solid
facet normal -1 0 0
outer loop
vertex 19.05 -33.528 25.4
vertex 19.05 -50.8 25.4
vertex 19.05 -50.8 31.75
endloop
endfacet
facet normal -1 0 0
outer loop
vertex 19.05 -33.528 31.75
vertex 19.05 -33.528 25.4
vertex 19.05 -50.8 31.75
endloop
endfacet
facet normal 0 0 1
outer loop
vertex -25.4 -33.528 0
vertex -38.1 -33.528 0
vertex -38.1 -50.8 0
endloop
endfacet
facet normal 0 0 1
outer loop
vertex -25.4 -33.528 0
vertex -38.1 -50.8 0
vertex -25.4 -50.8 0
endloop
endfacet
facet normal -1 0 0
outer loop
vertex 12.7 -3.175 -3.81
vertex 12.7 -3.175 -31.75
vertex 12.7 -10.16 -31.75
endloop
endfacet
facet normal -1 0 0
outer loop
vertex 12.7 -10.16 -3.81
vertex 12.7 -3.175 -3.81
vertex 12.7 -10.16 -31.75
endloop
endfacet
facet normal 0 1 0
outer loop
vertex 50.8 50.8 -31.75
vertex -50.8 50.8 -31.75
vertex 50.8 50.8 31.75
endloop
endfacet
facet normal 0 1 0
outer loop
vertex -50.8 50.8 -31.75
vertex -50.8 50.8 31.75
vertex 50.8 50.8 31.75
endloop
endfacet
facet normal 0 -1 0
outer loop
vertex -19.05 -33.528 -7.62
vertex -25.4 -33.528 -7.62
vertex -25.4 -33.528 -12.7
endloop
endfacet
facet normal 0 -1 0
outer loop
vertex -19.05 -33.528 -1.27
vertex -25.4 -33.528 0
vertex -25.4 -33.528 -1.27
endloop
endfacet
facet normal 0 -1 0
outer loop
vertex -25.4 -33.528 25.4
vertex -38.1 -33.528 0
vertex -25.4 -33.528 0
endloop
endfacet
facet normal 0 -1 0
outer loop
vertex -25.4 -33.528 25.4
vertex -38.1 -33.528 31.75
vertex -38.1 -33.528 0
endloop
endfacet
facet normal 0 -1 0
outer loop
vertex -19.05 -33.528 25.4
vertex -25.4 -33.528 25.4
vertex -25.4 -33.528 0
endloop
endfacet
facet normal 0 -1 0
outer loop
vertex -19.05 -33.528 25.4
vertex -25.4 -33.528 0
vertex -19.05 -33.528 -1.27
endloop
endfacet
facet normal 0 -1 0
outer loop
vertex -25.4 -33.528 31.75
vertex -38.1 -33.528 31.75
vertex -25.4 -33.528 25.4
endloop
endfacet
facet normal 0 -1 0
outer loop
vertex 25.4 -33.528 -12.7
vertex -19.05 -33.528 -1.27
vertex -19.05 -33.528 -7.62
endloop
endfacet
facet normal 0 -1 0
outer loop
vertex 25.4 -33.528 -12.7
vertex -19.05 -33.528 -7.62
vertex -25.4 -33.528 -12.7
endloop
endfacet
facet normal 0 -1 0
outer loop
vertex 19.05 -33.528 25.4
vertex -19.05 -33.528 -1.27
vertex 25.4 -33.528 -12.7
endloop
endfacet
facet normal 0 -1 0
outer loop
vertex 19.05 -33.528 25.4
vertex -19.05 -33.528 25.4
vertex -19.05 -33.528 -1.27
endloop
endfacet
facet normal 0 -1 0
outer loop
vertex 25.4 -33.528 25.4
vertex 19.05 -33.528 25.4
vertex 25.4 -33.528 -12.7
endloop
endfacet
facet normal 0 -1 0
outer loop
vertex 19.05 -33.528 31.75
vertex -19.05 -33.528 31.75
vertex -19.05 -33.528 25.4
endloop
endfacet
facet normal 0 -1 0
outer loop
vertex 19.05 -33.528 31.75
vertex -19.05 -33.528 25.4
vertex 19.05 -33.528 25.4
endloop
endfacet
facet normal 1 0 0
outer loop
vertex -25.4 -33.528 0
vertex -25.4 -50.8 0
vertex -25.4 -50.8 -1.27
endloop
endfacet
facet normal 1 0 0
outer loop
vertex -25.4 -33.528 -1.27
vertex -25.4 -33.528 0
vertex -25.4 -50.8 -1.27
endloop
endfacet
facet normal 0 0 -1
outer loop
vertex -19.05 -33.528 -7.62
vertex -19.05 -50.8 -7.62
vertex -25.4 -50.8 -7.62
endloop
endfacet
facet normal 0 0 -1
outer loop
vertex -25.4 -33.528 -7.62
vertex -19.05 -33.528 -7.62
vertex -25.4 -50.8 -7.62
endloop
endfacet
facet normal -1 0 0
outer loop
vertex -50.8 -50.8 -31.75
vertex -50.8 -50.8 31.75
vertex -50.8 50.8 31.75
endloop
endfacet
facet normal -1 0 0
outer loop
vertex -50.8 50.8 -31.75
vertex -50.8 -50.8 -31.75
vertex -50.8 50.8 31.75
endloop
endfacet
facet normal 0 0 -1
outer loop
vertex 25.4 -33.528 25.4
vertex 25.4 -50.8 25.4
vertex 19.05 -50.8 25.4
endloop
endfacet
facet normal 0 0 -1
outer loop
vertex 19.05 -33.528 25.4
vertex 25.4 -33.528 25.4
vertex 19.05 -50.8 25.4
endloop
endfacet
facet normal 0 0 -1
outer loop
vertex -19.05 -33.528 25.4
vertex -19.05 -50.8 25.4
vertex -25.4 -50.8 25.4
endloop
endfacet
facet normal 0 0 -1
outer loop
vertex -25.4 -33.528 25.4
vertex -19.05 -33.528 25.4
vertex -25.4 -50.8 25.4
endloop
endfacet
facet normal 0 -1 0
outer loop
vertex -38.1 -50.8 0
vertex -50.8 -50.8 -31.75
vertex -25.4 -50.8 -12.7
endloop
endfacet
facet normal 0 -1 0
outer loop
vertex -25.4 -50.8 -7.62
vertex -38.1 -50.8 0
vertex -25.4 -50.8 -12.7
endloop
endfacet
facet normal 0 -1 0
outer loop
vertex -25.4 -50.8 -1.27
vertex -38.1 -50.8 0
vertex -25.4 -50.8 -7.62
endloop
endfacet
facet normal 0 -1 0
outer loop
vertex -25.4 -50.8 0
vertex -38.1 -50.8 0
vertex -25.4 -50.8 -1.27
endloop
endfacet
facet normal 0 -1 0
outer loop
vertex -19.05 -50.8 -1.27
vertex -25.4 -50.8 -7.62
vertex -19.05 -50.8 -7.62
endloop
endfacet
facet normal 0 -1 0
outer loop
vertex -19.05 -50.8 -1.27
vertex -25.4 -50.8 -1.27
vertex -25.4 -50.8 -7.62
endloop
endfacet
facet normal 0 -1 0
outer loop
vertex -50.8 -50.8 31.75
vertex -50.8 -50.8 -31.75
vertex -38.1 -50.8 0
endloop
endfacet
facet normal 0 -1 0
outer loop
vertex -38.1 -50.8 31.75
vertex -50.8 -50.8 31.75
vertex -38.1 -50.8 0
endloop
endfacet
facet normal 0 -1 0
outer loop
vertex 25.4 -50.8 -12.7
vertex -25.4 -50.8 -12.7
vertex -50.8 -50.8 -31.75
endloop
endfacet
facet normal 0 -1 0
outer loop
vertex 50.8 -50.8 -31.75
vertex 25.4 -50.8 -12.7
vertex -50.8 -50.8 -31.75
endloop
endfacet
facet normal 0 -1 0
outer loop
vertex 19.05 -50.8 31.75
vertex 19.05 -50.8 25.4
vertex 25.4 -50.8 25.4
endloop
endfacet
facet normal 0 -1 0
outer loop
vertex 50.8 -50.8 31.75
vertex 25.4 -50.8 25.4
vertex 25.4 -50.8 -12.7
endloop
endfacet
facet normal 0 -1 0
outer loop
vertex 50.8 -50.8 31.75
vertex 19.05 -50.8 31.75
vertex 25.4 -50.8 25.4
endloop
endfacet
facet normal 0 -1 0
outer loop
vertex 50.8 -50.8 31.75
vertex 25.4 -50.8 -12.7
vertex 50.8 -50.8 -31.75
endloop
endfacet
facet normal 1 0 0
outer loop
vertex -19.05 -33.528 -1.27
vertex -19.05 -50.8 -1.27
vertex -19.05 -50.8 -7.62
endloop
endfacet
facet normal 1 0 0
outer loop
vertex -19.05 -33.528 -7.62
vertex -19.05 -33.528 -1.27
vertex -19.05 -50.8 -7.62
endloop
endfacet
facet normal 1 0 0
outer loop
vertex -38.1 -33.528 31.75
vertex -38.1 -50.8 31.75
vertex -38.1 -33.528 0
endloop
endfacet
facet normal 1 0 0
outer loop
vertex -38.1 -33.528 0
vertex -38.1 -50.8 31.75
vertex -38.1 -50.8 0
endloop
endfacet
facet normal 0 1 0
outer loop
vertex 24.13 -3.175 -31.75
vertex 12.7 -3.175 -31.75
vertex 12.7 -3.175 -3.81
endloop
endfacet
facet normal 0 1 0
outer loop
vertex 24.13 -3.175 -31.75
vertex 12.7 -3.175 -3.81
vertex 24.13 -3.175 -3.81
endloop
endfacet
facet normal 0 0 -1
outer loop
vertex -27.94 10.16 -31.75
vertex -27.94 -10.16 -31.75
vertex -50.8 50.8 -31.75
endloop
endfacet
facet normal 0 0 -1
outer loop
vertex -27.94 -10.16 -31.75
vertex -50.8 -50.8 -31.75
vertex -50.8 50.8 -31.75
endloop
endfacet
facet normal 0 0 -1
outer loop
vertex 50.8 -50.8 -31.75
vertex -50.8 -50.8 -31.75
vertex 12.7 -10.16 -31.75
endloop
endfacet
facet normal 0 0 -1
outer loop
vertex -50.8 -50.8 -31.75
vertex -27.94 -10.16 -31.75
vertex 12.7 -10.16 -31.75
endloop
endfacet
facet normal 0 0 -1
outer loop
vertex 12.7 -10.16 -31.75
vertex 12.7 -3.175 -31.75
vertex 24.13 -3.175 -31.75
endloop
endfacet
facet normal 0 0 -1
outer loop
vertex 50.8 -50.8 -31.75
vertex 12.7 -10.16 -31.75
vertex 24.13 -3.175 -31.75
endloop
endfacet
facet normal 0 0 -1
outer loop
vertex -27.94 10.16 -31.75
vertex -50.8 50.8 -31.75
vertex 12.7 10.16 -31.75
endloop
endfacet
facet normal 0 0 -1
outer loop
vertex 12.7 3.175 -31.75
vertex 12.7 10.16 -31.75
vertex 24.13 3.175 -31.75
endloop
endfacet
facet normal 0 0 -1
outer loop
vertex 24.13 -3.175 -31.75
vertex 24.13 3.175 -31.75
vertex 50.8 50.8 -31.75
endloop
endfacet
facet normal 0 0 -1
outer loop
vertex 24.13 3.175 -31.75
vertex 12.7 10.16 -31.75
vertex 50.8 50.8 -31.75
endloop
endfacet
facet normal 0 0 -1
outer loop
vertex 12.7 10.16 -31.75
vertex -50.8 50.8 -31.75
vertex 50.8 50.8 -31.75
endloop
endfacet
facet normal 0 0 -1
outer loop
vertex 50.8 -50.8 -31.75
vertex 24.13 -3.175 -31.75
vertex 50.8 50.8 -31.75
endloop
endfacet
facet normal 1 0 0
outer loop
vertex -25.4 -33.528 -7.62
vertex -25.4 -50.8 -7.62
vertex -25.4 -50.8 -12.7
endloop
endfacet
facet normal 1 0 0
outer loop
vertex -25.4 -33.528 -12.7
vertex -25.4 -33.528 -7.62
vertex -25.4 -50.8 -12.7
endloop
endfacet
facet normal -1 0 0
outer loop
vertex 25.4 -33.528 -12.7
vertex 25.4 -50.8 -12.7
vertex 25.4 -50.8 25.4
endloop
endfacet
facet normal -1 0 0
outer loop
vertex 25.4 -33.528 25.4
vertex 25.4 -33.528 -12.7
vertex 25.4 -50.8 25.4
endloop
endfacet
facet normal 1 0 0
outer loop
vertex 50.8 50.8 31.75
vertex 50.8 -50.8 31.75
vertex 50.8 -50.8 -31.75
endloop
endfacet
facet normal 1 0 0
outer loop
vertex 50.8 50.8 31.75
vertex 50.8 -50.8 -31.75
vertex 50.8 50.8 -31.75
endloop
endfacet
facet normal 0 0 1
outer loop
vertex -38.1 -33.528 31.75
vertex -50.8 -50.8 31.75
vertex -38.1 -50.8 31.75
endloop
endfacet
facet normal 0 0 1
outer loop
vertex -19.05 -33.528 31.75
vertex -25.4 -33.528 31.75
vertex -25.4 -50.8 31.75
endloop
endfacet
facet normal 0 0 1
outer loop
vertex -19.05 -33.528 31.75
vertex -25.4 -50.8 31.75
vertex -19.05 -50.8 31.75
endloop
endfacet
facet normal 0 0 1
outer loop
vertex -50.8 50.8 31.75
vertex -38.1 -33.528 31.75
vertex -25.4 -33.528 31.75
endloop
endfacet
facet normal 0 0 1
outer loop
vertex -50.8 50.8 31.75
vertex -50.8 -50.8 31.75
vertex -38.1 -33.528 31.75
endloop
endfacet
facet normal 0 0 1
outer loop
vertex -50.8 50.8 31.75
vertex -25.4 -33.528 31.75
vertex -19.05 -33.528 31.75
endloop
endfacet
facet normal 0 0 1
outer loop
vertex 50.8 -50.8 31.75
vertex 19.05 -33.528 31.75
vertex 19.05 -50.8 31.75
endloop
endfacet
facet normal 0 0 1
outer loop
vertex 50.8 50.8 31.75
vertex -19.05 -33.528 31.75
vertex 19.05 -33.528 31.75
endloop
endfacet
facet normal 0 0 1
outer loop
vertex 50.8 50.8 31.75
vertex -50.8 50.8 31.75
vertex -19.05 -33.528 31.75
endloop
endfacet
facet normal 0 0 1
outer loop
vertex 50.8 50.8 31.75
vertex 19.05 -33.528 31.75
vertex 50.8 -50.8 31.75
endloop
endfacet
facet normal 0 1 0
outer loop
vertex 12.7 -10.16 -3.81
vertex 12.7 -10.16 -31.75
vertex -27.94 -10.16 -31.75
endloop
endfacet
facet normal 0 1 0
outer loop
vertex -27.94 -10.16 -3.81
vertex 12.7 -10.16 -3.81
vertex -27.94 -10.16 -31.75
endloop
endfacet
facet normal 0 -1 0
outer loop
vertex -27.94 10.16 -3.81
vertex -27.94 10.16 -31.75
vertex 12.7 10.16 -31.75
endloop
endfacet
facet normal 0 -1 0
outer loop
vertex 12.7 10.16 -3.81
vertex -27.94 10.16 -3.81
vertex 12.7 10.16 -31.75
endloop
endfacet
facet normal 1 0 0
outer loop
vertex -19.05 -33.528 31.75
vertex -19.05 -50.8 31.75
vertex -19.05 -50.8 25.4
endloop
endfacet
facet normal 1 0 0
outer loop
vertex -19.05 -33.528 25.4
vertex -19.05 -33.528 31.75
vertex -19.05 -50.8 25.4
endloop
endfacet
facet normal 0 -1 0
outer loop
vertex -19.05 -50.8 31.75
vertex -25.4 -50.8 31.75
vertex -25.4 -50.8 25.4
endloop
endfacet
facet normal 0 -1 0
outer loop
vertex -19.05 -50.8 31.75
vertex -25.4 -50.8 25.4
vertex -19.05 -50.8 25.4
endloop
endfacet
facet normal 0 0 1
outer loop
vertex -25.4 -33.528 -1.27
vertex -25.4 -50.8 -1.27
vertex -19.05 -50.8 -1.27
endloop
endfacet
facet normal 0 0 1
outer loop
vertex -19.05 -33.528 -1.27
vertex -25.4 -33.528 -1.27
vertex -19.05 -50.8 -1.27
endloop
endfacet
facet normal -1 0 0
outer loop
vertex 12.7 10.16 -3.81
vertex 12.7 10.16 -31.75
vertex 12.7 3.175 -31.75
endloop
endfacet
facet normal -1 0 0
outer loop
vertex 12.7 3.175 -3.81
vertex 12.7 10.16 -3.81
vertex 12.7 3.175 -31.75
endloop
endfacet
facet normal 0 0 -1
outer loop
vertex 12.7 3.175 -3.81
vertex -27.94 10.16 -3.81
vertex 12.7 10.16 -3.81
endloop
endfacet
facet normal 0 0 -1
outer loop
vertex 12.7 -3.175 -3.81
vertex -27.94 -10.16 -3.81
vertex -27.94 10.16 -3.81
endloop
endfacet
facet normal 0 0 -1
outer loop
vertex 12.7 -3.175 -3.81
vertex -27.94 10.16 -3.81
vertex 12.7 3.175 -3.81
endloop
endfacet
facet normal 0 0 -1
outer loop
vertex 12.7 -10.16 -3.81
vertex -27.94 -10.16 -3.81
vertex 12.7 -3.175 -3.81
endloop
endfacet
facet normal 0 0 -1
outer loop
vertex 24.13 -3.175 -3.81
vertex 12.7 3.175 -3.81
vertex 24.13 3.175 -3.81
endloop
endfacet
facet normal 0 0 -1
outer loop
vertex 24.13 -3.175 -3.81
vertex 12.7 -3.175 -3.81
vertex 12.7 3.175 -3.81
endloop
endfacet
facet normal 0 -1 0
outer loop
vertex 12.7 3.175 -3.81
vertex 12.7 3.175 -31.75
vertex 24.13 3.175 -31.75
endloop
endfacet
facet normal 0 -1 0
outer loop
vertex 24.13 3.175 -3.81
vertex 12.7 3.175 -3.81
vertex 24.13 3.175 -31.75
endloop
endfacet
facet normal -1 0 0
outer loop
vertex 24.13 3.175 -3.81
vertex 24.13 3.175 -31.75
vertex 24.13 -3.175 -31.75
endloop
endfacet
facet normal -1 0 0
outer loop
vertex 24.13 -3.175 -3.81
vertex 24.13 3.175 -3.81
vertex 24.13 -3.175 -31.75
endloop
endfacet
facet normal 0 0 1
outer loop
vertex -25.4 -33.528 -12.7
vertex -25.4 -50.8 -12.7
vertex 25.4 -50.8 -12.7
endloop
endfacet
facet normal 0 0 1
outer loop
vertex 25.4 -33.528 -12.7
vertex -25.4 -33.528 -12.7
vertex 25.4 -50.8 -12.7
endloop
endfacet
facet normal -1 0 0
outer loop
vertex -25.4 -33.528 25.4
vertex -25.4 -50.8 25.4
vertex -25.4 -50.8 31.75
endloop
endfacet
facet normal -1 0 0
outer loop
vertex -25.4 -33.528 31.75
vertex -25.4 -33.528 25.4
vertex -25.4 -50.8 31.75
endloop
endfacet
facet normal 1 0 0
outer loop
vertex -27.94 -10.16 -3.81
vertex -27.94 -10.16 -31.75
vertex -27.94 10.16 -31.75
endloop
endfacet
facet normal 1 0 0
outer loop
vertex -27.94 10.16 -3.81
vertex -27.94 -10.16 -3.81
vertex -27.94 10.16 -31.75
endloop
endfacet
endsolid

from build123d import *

# Parameters (mm, degrees)
F0_W     = 101.6
F0_H     = 101.6
F1_DEPTH = 31.75
F2_W     = 11.43
F2_H     = 3.175
F3_DEPTH = 27.94
F4_W     = 25.4
F4_H     = 12.7
F5_DEPTH = 17.272


with BuildPart() as f1:
    # F0 (on Top) → F1 (new body, symmetric)
    with BuildSketch(Plane.XY):
        Rectangle(F0_W, F0_H)
    extrude(amount=F1_DEPTH, both=True)

    # F2 (on face) → F3 (cut)
    with BuildSketch(Plane(origin=(0, 0, -31.75), x_dir=(1, 0, 0), z_dir=(0, 0, -1))):
        Polygon((12.7, 0), (0, 0), (-27.94, 0), (-27.94, -10.16), (12.7, -10.16), (12.7, -3.175), align=None)
        Polygon((-27.94, 0), (0, 0), (12.7, 0), (12.7, 3.175), (12.7, 10.16), (-27.94, 10.16), align=None)
        with Locations((18.415, 1.5875)):
            Rectangle(F2_W, F2_H)
        with Locations((18.415, -1.5875)):
            Rectangle(F2_W, F2_H)
    extrude(amount=-F3_DEPTH, mode=Mode.SUBTRACT)

    # F4 (on face) → F5 (cut)
    with BuildSketch(Plane.XZ.offset(50.8)):
        Polygon((-38.1, 0), (-25.4, 0), (-25.4, 25.4), (-25.4, 31.75), (-38.1, 31.75), align=None)
        Polygon((-25.4, 0), (0, 0), (0, 31.75), (-19.05, 31.75), (-19.05, 25.4), (-25.4, 25.4), align=None)
        Polygon((0, 31.75), (0, 0), (25.4, 0), (25.4, 25.4), (19.05, 25.4), (19.05, 31.75), align=None)
        with Locations((12.7, -6.35)):
            Rectangle(F4_W, F4_H)
        Polygon((0, -12.7), (0, 0), (-25.4, 0), (-25.4, -1.27), (-19.05, -1.27), (-19.05, -7.62), (-25.4, -7.62), (-25.4, -12.7), align=None)
    extrude(amount=-F5_DEPTH, mode=Mode.SUBTRACT)


solid = f1.part
